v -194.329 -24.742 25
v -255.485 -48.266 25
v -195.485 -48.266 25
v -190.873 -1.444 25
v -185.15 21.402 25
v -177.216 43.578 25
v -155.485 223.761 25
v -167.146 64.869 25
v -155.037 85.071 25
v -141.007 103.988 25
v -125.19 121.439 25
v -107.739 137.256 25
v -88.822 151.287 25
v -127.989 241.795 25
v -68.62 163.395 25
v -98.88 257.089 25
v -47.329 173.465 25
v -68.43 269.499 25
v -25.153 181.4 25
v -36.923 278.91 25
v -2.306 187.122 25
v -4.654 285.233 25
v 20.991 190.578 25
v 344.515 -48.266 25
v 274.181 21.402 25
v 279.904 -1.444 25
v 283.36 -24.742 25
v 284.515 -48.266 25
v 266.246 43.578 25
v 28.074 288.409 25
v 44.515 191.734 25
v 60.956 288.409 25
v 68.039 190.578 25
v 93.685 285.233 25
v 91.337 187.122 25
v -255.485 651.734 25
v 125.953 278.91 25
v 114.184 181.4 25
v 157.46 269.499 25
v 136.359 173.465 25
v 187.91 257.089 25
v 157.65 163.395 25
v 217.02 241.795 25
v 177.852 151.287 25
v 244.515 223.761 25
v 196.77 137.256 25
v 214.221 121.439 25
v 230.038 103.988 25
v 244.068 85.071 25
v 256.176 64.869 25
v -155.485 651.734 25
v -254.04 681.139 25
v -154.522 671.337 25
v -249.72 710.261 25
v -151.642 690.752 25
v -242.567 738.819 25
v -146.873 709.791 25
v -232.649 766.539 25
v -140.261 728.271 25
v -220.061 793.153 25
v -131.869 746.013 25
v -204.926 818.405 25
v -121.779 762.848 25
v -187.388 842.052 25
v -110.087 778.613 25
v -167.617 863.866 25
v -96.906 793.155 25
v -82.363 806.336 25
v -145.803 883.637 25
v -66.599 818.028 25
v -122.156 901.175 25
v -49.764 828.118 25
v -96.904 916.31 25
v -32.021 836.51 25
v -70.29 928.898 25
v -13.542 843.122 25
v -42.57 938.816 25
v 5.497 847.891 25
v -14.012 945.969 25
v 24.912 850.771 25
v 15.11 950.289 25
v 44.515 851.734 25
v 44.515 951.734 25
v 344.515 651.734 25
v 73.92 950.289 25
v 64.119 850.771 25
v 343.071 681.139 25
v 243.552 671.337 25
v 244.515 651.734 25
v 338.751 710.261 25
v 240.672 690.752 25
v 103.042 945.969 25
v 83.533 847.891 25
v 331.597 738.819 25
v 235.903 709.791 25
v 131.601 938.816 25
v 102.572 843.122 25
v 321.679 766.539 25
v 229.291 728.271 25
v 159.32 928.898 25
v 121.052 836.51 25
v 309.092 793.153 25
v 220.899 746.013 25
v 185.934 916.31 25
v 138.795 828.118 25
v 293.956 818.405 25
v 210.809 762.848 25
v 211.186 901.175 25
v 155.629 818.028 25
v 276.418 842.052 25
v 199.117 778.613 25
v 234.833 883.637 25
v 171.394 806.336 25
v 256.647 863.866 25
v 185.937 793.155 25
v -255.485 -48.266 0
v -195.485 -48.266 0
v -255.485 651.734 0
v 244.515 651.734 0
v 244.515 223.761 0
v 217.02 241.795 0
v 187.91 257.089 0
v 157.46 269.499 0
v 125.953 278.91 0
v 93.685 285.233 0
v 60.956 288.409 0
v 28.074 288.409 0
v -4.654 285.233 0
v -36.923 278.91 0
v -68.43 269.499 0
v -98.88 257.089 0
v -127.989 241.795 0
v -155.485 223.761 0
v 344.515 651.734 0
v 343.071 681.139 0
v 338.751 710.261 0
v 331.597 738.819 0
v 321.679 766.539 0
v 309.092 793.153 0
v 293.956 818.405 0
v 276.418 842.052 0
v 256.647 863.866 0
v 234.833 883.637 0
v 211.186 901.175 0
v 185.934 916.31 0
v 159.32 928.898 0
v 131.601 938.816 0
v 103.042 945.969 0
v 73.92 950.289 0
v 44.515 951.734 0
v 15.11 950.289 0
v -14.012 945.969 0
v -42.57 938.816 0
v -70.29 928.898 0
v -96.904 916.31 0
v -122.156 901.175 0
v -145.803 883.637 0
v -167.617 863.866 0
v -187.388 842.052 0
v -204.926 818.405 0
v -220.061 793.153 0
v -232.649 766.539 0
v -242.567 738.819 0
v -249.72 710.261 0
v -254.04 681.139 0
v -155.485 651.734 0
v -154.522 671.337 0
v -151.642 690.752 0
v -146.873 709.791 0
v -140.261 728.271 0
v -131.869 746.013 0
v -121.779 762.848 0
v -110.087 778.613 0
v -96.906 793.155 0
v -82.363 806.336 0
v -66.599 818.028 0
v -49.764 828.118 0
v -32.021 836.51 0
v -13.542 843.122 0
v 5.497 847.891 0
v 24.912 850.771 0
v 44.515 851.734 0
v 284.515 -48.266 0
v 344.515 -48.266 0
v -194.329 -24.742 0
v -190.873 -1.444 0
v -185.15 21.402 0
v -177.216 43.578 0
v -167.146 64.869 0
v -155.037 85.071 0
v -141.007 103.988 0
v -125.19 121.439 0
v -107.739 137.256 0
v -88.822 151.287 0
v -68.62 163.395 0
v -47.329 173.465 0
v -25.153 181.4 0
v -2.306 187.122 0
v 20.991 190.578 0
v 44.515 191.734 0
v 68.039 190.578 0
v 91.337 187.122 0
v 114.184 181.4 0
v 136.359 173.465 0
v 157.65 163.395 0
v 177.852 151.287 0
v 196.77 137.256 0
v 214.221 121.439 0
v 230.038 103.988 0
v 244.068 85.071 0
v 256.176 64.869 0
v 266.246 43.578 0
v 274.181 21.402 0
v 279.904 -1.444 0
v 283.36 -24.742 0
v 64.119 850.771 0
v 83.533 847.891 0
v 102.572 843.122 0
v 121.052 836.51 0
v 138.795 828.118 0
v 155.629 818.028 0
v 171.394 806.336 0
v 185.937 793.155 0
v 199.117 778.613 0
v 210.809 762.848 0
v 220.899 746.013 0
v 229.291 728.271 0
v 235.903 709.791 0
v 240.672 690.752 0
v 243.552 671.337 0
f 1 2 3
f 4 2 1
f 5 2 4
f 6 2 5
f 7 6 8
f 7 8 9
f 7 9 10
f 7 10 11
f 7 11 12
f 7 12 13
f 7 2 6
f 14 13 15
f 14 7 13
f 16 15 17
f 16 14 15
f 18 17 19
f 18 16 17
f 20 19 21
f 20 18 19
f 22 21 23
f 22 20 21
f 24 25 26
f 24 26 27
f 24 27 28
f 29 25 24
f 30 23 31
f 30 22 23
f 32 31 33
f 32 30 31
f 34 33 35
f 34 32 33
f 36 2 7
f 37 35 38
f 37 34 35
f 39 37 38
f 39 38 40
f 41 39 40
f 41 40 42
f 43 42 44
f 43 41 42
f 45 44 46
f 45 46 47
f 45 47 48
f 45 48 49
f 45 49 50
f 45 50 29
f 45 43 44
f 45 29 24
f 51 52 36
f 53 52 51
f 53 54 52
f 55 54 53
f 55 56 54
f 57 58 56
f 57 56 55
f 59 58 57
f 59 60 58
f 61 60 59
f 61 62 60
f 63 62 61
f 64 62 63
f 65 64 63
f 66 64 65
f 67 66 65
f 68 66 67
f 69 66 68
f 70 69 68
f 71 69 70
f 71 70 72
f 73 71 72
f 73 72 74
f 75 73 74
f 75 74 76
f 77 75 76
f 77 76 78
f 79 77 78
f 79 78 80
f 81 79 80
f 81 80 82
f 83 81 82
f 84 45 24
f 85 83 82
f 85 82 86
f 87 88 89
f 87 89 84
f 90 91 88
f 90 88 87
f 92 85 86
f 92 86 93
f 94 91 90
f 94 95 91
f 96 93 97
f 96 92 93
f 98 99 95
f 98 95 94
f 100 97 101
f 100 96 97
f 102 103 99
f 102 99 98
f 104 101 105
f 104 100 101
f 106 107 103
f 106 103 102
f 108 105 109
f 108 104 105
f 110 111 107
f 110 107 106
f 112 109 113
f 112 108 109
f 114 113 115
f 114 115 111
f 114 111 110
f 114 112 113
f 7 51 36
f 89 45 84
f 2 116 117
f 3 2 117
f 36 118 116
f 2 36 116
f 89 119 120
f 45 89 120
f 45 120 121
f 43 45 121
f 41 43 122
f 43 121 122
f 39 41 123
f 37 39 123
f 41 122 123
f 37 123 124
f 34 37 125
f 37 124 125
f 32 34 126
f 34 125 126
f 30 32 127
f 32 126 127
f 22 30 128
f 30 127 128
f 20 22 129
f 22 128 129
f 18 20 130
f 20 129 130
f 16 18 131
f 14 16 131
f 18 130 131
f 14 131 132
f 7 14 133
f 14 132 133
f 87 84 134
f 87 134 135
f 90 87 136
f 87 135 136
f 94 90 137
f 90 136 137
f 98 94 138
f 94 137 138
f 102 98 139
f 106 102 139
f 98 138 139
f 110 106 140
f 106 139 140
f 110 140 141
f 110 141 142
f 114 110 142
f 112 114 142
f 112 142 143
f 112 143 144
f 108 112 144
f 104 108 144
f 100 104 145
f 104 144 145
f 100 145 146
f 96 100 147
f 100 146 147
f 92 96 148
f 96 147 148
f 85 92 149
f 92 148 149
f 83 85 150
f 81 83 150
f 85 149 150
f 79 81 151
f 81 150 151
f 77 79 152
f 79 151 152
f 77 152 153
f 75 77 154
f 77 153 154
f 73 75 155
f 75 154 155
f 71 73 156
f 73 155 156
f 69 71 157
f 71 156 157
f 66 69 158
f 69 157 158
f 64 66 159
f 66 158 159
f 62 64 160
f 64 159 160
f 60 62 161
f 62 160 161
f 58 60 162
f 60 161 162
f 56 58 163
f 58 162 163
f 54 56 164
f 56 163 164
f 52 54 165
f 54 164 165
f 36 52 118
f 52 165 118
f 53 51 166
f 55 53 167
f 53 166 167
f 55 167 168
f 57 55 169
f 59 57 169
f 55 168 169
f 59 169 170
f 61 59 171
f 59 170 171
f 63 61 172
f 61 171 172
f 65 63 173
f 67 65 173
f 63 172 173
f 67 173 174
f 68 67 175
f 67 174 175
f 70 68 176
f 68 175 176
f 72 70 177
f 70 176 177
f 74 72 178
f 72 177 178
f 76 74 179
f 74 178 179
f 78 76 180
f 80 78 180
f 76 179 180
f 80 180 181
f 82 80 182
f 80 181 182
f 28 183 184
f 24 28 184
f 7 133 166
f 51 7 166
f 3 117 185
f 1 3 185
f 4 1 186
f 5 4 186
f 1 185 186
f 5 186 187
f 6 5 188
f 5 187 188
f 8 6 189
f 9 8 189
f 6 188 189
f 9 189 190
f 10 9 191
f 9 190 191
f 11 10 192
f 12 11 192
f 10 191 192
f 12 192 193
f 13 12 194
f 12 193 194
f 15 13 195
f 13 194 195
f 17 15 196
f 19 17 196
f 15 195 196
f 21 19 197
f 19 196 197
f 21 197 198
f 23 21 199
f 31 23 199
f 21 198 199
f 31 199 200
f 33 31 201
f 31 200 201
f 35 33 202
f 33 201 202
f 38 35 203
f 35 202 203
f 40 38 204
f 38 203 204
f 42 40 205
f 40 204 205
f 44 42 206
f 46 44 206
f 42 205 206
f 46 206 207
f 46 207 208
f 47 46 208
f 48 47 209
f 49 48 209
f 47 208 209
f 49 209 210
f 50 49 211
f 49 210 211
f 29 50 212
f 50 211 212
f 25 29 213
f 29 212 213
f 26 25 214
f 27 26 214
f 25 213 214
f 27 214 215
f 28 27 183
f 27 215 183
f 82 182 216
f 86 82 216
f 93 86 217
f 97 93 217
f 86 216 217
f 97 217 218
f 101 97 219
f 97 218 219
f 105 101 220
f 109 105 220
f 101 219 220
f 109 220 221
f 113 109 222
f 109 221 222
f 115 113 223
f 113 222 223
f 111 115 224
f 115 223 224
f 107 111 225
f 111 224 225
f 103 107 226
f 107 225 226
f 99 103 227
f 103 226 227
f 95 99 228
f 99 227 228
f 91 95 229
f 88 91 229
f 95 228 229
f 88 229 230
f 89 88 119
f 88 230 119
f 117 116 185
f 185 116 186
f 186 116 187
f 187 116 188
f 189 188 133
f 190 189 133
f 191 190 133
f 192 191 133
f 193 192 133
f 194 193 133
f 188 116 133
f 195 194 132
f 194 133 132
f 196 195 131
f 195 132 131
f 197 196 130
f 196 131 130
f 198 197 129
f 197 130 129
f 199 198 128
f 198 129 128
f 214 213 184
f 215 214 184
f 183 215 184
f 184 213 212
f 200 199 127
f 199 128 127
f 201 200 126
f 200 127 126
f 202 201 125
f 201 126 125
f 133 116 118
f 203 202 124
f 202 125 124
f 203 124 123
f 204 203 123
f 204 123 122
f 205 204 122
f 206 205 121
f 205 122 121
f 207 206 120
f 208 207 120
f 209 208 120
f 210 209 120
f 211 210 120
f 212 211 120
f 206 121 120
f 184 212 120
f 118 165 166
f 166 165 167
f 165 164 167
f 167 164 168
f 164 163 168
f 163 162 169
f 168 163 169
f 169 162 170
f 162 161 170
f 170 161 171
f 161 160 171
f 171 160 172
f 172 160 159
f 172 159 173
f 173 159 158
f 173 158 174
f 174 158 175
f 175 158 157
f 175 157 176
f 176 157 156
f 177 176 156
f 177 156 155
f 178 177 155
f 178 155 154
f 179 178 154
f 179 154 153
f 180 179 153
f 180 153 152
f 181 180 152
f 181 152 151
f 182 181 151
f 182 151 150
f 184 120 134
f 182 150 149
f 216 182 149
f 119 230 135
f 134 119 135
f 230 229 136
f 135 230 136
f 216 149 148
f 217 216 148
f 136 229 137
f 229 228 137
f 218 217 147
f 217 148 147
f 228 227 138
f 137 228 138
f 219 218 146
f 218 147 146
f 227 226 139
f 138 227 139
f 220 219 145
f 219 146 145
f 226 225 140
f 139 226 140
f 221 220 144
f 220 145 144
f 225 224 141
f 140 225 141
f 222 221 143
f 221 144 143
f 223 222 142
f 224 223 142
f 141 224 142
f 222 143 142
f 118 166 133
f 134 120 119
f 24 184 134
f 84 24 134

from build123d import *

# Parameters (mm, degrees)
F1_DEPTH = 25


with BuildPart() as f1:
    # F0 (on Top) → F1 (new body)
    with BuildSketch(Plane.XY):
        with BuildLine():
            Line((-255.484788, 651.733869), (-255.484788, -48.266131))
            Line((-255.484788, -48.266131), (-195.484788, -48.266131))
            ThreePointArc((-195.484788, -48.266131), (44.515212, 191.733869), (284.515212, -48.266131))
            Line((284.515212, -48.266131), (344.515212, -48.266131))
            Line((344.515212, -48.266131), (344.515212, 441.456646))
            Line((344.515212, 441.456646), (344.515212, 651.733869))
            ThreePointArc((344.515212, 651.733869), (44.515212, 951.733869), (-255.484788, 651.733869))
        make_face()
        with BuildLine():
            Line((-155.484788, 223.761452), (-155.484788, 651.733869))
            ThreePointArc((-155.484788, 651.733869), (-96.906144, 793.155225), (44.515212, 851.733869))
            ThreePointArc((44.515212, 851.733869), (185.936568, 793.155225), (244.515212, 651.733869))
            Line((244.515212, 651.733869), (244.515212, 223.761452))
            ThreePointArc((244.515212, 223.761452), (44.515212, 288.806911), (-155.484788, 223.761452))
        make_face(mode=Mode.SUBTRACT)
    extrude(amount=F1_DEPTH)


solid = f1.part
